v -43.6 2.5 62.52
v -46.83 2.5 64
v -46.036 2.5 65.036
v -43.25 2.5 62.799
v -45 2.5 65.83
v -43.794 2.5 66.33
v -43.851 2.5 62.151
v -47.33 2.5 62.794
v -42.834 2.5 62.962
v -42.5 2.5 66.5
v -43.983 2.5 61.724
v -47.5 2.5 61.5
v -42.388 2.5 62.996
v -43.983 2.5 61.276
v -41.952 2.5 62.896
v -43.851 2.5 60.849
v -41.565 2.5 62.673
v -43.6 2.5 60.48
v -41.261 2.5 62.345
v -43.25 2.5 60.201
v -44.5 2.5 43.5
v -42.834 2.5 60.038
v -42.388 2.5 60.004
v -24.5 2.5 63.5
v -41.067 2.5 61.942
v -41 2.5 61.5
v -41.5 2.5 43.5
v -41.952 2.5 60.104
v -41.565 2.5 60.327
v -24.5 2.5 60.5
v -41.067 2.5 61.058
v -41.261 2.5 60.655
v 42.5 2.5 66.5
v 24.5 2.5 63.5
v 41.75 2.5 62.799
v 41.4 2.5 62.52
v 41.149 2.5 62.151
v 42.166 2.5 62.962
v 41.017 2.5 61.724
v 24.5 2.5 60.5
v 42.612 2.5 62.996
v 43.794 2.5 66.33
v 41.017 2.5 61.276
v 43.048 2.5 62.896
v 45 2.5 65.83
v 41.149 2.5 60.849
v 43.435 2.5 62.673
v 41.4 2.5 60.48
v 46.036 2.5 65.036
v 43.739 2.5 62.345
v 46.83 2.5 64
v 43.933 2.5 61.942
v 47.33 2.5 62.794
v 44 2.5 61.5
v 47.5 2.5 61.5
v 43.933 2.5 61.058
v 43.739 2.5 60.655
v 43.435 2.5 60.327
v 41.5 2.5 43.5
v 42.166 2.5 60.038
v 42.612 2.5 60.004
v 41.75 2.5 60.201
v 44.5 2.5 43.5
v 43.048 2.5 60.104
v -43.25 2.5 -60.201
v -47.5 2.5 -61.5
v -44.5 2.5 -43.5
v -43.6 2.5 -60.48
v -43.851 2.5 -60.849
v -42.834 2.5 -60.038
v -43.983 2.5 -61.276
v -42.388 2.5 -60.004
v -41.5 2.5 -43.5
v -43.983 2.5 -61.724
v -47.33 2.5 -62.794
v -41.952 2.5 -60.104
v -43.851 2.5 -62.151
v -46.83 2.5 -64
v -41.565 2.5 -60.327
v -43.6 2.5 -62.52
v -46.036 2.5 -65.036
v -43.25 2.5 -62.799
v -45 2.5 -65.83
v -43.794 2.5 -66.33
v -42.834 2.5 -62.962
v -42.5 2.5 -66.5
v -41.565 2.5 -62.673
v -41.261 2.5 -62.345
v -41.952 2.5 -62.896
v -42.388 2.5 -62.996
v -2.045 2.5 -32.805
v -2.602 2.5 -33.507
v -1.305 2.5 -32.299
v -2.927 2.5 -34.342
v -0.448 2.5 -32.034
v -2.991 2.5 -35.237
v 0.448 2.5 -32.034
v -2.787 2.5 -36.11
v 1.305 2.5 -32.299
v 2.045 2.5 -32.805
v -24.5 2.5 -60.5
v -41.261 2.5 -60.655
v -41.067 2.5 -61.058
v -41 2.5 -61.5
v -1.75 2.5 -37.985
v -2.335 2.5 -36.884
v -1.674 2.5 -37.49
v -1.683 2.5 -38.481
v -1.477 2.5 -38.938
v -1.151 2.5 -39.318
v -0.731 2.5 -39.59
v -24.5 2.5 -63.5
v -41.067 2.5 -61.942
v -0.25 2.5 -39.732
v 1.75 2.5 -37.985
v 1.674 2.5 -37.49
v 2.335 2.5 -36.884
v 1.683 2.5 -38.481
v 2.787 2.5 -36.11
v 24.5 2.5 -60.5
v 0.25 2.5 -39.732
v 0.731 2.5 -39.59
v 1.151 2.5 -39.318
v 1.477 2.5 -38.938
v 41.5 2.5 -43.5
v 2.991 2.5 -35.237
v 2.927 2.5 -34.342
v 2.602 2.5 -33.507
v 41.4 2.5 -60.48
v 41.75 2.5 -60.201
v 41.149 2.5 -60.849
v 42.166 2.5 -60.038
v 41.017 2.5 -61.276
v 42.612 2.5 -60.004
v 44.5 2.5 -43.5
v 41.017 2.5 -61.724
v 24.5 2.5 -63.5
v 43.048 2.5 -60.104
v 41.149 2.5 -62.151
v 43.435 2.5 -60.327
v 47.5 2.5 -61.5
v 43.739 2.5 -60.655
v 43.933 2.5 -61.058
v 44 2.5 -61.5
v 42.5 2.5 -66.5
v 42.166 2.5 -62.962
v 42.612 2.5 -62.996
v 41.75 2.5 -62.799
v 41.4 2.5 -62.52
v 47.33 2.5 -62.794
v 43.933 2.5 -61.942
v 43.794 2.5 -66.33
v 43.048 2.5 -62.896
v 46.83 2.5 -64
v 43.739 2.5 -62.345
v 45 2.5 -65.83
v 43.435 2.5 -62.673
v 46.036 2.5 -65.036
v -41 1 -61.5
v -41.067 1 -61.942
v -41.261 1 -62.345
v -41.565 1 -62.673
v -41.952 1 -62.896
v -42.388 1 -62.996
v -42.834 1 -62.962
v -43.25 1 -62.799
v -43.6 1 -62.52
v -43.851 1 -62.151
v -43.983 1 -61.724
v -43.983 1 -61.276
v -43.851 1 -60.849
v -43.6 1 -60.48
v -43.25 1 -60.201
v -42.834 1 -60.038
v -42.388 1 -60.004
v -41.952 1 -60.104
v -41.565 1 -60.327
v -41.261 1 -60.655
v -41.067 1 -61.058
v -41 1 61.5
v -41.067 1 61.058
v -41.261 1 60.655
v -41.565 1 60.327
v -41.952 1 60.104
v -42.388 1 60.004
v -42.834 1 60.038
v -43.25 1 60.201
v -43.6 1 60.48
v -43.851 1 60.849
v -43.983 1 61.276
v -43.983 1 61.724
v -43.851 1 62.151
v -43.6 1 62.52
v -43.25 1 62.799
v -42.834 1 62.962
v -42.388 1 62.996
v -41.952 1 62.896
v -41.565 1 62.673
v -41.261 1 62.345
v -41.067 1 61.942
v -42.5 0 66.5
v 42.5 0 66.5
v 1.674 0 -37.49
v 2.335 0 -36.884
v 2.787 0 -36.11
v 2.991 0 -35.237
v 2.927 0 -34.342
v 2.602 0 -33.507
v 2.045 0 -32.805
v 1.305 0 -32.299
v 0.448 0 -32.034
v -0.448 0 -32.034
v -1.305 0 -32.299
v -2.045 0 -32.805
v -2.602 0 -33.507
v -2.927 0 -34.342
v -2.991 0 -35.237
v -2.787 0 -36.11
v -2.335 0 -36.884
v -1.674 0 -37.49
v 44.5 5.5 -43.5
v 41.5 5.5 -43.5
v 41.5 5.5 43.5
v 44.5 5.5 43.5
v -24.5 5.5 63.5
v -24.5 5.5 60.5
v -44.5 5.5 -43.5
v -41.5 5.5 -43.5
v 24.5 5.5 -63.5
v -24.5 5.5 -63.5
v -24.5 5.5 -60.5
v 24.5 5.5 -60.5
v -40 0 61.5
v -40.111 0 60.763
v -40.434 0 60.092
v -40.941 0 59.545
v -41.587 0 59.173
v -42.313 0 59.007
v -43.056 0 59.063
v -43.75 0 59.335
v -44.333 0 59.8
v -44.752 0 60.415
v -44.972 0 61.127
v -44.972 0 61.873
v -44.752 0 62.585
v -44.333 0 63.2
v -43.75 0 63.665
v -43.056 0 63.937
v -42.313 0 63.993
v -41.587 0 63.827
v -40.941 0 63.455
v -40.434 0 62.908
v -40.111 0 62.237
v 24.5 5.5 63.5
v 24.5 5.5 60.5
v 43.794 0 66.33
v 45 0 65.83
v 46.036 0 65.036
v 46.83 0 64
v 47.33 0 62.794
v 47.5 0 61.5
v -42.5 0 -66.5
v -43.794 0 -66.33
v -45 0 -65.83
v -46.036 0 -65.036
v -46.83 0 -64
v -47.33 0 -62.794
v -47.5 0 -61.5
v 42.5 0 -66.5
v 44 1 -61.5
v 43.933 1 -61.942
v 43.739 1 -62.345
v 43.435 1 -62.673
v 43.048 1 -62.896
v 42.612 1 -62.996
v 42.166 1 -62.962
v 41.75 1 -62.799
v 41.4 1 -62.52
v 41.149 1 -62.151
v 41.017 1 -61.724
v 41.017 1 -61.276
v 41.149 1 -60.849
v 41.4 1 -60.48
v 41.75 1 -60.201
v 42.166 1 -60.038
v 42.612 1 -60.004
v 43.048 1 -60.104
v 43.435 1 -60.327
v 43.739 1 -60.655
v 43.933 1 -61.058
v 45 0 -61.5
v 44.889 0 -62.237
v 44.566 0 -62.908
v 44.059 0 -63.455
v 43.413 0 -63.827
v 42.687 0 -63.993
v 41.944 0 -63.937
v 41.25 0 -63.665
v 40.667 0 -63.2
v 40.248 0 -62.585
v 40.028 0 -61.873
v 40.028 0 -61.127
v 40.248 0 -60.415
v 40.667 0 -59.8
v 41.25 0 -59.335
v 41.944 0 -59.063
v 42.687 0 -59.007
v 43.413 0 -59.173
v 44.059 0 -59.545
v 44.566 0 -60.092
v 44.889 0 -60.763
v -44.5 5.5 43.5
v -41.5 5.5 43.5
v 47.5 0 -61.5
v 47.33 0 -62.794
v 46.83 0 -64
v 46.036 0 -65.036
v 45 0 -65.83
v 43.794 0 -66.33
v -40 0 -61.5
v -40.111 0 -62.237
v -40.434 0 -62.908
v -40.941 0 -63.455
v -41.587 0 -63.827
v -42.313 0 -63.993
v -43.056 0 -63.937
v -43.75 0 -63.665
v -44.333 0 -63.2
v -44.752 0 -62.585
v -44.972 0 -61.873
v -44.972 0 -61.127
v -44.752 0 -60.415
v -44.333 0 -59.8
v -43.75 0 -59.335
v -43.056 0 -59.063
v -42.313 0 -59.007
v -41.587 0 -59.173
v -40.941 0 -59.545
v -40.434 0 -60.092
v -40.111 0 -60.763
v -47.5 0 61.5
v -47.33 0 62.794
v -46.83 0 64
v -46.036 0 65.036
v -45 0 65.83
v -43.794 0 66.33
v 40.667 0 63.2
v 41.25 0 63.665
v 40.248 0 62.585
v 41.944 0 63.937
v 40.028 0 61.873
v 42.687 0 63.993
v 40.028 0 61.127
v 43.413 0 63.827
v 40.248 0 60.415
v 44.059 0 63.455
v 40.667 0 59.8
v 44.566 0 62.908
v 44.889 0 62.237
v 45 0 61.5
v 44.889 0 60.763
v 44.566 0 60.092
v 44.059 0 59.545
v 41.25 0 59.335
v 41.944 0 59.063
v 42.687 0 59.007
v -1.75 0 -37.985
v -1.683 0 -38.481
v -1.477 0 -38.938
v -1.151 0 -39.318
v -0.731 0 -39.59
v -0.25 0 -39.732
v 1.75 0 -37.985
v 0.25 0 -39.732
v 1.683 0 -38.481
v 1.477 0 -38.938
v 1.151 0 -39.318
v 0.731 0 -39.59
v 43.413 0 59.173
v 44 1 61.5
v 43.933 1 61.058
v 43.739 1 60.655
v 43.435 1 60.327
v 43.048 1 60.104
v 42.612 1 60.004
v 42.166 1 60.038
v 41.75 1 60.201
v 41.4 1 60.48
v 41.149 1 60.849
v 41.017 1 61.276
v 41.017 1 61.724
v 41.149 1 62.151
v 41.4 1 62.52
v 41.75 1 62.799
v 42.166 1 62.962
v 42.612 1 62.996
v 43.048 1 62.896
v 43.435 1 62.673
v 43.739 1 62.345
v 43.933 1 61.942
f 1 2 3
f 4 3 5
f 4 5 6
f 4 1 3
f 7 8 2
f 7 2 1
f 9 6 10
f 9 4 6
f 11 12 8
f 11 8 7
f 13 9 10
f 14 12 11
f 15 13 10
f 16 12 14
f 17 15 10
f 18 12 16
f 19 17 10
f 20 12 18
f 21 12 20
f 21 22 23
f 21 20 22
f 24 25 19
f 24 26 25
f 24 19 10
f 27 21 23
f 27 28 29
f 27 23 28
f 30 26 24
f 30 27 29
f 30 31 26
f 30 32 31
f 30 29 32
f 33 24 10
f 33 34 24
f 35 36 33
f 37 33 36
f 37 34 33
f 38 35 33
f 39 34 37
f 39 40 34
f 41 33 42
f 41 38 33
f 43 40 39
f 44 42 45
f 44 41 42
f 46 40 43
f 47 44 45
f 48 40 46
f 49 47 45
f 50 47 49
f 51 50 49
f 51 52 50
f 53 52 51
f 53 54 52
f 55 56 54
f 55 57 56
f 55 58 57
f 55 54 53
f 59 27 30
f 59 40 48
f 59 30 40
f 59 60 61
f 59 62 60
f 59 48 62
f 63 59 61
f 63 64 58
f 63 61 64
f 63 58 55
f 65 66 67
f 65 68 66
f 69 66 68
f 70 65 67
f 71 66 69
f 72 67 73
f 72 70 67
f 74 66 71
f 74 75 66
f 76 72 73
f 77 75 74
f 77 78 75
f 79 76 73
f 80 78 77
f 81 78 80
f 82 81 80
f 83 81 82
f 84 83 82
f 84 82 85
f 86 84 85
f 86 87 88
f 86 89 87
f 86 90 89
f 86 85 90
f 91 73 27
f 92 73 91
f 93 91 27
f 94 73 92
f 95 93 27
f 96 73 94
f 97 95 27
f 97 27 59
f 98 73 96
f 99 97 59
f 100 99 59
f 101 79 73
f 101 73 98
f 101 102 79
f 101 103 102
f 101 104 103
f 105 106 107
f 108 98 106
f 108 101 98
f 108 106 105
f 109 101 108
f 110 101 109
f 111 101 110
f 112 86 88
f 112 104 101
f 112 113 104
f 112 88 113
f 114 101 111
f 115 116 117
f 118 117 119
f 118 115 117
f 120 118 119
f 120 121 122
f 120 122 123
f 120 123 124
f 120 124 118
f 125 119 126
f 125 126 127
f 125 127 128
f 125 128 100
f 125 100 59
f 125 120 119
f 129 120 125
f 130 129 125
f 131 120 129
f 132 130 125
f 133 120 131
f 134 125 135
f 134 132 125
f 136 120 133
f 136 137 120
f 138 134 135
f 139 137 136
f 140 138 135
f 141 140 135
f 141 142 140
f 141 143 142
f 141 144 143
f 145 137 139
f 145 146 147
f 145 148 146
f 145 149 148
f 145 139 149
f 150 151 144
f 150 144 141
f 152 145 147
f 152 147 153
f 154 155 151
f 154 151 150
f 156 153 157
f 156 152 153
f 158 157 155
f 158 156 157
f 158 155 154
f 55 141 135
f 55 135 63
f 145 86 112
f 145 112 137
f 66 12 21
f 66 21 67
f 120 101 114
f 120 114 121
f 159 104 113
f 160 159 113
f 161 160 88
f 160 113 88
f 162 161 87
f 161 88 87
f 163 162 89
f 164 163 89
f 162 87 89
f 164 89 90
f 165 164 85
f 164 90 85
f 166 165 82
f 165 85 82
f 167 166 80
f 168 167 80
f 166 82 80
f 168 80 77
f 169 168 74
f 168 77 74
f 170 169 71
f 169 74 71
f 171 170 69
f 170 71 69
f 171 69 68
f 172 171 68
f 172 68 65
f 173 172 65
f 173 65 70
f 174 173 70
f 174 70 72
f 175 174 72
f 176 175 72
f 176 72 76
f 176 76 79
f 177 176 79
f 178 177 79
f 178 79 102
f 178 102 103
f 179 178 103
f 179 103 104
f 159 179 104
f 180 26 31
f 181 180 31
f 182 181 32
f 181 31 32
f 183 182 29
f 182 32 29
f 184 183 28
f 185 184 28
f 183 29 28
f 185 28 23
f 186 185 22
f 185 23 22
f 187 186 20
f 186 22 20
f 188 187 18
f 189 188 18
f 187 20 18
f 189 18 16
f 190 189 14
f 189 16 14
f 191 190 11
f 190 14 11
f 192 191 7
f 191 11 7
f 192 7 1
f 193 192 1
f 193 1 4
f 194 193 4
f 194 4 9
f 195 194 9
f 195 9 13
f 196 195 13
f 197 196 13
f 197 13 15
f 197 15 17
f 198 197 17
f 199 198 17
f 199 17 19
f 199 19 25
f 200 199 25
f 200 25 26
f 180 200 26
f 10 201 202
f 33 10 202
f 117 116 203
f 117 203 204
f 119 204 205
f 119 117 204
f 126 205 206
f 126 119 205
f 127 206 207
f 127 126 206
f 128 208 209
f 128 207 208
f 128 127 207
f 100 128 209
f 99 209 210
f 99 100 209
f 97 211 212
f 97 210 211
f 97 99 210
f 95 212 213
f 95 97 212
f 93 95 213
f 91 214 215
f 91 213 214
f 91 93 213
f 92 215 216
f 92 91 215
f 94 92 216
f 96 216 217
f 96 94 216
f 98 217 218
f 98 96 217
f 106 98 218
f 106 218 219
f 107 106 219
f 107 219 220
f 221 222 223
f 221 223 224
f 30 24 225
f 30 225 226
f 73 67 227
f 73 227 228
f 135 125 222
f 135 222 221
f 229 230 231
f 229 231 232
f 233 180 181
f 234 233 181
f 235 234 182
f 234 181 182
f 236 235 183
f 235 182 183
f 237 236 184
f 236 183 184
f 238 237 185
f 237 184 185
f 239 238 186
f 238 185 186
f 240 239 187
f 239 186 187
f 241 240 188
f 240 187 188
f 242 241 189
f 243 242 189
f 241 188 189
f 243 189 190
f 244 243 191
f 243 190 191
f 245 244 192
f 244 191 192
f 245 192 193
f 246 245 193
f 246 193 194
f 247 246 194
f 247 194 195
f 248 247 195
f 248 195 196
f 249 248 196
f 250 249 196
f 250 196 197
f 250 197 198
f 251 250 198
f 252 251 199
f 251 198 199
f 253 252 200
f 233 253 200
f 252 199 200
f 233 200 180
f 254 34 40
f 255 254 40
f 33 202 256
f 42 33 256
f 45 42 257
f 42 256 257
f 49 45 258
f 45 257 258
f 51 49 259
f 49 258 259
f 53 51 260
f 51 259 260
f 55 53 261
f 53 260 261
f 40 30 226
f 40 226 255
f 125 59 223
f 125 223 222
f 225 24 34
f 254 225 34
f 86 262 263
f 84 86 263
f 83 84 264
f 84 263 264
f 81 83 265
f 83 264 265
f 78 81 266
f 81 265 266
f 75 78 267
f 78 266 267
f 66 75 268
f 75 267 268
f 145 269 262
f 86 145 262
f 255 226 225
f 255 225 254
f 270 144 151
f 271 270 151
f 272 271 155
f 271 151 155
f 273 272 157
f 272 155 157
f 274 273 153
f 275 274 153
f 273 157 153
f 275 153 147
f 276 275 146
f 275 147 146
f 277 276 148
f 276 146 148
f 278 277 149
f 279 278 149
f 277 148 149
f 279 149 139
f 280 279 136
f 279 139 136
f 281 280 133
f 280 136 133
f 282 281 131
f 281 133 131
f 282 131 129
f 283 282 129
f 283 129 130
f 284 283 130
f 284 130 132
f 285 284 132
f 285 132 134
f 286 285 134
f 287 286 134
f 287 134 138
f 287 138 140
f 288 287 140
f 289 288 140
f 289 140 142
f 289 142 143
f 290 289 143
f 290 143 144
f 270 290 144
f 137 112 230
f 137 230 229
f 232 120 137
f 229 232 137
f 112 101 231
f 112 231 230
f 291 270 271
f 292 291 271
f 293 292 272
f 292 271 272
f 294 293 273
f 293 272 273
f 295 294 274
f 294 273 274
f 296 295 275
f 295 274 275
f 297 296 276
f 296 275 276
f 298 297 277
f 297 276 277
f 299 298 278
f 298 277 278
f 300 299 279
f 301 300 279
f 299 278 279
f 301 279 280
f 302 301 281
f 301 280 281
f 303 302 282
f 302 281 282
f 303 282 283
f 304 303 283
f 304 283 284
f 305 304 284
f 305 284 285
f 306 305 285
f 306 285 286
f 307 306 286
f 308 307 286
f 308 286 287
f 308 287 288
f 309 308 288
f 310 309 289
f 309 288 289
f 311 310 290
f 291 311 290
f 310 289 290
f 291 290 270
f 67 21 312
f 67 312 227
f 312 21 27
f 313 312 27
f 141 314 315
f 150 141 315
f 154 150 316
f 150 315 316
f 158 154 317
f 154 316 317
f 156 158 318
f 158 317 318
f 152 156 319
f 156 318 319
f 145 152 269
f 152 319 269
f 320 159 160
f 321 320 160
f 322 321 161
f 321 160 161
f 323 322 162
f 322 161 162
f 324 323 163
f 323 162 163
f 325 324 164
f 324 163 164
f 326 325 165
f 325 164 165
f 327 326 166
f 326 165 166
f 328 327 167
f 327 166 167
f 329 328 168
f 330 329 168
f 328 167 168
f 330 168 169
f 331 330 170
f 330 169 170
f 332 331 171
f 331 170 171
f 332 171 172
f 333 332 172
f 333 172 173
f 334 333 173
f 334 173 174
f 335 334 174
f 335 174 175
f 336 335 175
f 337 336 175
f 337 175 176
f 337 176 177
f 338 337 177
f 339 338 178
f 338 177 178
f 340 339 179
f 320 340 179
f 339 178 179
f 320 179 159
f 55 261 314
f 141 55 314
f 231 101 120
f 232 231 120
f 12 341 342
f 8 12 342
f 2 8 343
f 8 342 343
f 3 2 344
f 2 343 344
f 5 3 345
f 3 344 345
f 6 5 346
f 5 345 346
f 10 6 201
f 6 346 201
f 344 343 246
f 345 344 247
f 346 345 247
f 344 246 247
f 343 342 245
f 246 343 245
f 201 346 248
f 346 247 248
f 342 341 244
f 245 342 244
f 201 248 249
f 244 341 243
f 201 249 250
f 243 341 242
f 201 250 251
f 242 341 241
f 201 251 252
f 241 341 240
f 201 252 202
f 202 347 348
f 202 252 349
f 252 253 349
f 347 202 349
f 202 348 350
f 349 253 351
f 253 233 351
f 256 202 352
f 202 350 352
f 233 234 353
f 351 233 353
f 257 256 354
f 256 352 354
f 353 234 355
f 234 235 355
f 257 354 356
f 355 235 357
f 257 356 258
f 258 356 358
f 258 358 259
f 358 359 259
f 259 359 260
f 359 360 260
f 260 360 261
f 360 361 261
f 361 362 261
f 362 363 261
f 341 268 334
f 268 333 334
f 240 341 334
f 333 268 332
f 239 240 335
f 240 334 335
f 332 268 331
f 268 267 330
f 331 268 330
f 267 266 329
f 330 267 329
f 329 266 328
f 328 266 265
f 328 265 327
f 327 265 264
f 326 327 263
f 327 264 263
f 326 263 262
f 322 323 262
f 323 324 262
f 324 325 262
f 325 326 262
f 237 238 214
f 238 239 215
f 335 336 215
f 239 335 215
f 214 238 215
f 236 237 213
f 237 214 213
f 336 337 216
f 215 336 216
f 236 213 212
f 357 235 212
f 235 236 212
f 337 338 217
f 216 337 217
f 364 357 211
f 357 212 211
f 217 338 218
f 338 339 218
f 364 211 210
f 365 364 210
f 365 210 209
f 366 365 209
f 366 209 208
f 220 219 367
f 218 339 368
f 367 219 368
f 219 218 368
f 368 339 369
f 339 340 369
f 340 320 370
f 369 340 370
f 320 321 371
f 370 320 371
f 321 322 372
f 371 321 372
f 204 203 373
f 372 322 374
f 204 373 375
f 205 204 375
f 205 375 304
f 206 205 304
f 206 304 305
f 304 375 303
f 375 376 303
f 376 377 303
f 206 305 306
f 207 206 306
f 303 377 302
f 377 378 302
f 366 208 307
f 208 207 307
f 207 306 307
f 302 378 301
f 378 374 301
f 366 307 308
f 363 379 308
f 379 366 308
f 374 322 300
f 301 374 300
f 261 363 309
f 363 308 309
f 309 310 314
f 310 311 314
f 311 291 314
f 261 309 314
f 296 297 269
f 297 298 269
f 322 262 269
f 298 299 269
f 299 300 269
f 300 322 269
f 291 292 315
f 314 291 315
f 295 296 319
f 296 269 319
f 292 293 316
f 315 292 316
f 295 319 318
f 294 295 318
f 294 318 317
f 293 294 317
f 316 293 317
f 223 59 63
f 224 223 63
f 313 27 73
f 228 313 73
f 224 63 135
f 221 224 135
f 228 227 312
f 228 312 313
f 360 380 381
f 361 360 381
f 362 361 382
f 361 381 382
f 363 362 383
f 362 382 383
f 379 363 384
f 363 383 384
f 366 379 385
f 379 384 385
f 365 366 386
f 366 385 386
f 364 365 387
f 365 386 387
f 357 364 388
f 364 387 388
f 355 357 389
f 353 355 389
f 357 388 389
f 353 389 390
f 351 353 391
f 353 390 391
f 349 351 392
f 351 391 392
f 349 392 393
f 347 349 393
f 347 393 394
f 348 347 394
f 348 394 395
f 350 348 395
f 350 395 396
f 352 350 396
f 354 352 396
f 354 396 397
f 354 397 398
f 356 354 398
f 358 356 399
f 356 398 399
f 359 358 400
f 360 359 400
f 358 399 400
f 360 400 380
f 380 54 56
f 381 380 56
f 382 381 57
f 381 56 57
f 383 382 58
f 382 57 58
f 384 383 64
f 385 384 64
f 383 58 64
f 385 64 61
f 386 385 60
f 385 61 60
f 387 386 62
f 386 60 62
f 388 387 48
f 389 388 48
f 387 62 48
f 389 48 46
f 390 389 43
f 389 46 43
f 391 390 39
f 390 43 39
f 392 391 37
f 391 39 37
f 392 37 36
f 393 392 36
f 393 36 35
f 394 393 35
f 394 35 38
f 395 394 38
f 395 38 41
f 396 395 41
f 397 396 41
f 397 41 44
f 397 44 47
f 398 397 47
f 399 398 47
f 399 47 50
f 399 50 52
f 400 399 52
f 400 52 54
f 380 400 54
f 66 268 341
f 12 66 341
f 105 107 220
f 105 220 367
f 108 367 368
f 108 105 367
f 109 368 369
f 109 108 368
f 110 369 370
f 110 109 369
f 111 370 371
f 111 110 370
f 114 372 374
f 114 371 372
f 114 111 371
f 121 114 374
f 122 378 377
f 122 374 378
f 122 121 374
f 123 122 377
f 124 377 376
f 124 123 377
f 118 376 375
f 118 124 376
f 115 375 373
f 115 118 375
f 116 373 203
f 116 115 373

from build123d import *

# Parameters (mm, degrees)
EXTRUDE_1_DEPTH     = 2.5
SKETCH_2_R          = 1.5
CUT_EXTRUDE_1_DEPTH = 11
SKETCH_3_W          = 49
SKETCH_3_H          = 3
SKETCH_3_W_2        = 3
SKETCH_3_H_2        = 87
EXTRUDE_2_DEPTH     = 3
CUT_EXTRUDE_2_DEPTH = 6
CHAMFER_1_SIZE      = 1


with BuildPart() as part:
    # Эскиз1 → Бобышка-Вытянуть1 (new body)
    with BuildSketch(Plane(origin=(0, 0, 0), x_dir=(1, 0, 0), z_dir=(0, 1, 0))):
        with BuildLine():
            Line((-42.5, -66.5), (42.5, -66.5))
            ThreePointArc((42.5, -66.5), (46.035533906, -65.035533906), (47.5, -61.5))
            Line((47.5, -61.5), (47.5, 61.5))
            ThreePointArc((47.5, 61.5), (46.035533906, 65.035533906), (42.5, 66.5))
            Line((42.5, 66.5), (-42.5, 66.5))
            ThreePointArc((-42.5, 66.5), (-46.035533906, 65.035533906), (-47.5, 61.5))
            Line((-47.5, 61.5), (-47.5, -61.5))
            ThreePointArc((-47.5, -61.5), (-46.035533906, -65.035533906), (-42.5, -66.5))
        make_face()
    extrude(amount=EXTRUDE_1_DEPTH)

    # Эскиз2 → Вырез-Вытянуть1 (cut)
    with BuildSketch(Plane(origin=(0, 2.5, 0), x_dir=(1, 0, 0), z_dir=(0, 1, 0))):
        with Locations((-42.5, 61.5)):
            Circle(SKETCH_2_R)
        with Locations((42.5, 61.5)):
            Circle(SKETCH_2_R)
        with Locations((42.5, -61.5)):
            Circle(SKETCH_2_R)
        with Locations((-42.5, -61.5)):
            Circle(SKETCH_2_R)
    extrude(amount=-CUT_EXTRUDE_1_DEPTH, mode=Mode.SUBTRACT)

    # Эскиз3 → Бобышка-Вытянуть2 (add)
    with BuildSketch(Plane(origin=(0, 2.5, 0), x_dir=(1, 0, 0), z_dir=(0, 1, 0))):
        with Locations((0, 62)):
            Rectangle(SKETCH_3_W, SKETCH_3_H)
        with Locations((0, -62)):
            Rectangle(SKETCH_3_W, SKETCH_3_H)
        with Locations((-43, 0)):
            Rectangle(SKETCH_3_W_2, SKETCH_3_H_2)
        with Locations((43, 0)):
            Rectangle(SKETCH_3_W_2, SKETCH_3_H_2)
    extrude(amount=EXTRUDE_2_DEPTH)

    # Эскиз4 → Вырез-Вытянуть2 (cut)
    with BuildSketch(Plane(origin=(0, 2.5, 0), x_dir=(1, 0, 0), z_dir=(0, 1, 0))):
        with BuildLine():
            ThreePointArc((-1.673910041, 37.489583333), (0, 39.75), (1.673910041, 37.489583333))
            ThreePointArc((1.673910041, 37.489583333), (0, 32), (-1.673910041, 37.489583333))
        make_face()
    extrude(amount=-CUT_EXTRUDE_2_DEPTH, mode=Mode.SUBTRACT)

    # Фаска1
    chamfer_1_edges = [part.edges().sort_by_distance(p)[0] for p in [
        (-44, 0, 61.5),
        (41, 0, 61.5),
        (41, 0, -61.5),
        (-44, 0, -61.5),
    ]]
    chamfer(chamfer_1_edges, length=CHAMFER_1_SIZE)


solid = part.part
